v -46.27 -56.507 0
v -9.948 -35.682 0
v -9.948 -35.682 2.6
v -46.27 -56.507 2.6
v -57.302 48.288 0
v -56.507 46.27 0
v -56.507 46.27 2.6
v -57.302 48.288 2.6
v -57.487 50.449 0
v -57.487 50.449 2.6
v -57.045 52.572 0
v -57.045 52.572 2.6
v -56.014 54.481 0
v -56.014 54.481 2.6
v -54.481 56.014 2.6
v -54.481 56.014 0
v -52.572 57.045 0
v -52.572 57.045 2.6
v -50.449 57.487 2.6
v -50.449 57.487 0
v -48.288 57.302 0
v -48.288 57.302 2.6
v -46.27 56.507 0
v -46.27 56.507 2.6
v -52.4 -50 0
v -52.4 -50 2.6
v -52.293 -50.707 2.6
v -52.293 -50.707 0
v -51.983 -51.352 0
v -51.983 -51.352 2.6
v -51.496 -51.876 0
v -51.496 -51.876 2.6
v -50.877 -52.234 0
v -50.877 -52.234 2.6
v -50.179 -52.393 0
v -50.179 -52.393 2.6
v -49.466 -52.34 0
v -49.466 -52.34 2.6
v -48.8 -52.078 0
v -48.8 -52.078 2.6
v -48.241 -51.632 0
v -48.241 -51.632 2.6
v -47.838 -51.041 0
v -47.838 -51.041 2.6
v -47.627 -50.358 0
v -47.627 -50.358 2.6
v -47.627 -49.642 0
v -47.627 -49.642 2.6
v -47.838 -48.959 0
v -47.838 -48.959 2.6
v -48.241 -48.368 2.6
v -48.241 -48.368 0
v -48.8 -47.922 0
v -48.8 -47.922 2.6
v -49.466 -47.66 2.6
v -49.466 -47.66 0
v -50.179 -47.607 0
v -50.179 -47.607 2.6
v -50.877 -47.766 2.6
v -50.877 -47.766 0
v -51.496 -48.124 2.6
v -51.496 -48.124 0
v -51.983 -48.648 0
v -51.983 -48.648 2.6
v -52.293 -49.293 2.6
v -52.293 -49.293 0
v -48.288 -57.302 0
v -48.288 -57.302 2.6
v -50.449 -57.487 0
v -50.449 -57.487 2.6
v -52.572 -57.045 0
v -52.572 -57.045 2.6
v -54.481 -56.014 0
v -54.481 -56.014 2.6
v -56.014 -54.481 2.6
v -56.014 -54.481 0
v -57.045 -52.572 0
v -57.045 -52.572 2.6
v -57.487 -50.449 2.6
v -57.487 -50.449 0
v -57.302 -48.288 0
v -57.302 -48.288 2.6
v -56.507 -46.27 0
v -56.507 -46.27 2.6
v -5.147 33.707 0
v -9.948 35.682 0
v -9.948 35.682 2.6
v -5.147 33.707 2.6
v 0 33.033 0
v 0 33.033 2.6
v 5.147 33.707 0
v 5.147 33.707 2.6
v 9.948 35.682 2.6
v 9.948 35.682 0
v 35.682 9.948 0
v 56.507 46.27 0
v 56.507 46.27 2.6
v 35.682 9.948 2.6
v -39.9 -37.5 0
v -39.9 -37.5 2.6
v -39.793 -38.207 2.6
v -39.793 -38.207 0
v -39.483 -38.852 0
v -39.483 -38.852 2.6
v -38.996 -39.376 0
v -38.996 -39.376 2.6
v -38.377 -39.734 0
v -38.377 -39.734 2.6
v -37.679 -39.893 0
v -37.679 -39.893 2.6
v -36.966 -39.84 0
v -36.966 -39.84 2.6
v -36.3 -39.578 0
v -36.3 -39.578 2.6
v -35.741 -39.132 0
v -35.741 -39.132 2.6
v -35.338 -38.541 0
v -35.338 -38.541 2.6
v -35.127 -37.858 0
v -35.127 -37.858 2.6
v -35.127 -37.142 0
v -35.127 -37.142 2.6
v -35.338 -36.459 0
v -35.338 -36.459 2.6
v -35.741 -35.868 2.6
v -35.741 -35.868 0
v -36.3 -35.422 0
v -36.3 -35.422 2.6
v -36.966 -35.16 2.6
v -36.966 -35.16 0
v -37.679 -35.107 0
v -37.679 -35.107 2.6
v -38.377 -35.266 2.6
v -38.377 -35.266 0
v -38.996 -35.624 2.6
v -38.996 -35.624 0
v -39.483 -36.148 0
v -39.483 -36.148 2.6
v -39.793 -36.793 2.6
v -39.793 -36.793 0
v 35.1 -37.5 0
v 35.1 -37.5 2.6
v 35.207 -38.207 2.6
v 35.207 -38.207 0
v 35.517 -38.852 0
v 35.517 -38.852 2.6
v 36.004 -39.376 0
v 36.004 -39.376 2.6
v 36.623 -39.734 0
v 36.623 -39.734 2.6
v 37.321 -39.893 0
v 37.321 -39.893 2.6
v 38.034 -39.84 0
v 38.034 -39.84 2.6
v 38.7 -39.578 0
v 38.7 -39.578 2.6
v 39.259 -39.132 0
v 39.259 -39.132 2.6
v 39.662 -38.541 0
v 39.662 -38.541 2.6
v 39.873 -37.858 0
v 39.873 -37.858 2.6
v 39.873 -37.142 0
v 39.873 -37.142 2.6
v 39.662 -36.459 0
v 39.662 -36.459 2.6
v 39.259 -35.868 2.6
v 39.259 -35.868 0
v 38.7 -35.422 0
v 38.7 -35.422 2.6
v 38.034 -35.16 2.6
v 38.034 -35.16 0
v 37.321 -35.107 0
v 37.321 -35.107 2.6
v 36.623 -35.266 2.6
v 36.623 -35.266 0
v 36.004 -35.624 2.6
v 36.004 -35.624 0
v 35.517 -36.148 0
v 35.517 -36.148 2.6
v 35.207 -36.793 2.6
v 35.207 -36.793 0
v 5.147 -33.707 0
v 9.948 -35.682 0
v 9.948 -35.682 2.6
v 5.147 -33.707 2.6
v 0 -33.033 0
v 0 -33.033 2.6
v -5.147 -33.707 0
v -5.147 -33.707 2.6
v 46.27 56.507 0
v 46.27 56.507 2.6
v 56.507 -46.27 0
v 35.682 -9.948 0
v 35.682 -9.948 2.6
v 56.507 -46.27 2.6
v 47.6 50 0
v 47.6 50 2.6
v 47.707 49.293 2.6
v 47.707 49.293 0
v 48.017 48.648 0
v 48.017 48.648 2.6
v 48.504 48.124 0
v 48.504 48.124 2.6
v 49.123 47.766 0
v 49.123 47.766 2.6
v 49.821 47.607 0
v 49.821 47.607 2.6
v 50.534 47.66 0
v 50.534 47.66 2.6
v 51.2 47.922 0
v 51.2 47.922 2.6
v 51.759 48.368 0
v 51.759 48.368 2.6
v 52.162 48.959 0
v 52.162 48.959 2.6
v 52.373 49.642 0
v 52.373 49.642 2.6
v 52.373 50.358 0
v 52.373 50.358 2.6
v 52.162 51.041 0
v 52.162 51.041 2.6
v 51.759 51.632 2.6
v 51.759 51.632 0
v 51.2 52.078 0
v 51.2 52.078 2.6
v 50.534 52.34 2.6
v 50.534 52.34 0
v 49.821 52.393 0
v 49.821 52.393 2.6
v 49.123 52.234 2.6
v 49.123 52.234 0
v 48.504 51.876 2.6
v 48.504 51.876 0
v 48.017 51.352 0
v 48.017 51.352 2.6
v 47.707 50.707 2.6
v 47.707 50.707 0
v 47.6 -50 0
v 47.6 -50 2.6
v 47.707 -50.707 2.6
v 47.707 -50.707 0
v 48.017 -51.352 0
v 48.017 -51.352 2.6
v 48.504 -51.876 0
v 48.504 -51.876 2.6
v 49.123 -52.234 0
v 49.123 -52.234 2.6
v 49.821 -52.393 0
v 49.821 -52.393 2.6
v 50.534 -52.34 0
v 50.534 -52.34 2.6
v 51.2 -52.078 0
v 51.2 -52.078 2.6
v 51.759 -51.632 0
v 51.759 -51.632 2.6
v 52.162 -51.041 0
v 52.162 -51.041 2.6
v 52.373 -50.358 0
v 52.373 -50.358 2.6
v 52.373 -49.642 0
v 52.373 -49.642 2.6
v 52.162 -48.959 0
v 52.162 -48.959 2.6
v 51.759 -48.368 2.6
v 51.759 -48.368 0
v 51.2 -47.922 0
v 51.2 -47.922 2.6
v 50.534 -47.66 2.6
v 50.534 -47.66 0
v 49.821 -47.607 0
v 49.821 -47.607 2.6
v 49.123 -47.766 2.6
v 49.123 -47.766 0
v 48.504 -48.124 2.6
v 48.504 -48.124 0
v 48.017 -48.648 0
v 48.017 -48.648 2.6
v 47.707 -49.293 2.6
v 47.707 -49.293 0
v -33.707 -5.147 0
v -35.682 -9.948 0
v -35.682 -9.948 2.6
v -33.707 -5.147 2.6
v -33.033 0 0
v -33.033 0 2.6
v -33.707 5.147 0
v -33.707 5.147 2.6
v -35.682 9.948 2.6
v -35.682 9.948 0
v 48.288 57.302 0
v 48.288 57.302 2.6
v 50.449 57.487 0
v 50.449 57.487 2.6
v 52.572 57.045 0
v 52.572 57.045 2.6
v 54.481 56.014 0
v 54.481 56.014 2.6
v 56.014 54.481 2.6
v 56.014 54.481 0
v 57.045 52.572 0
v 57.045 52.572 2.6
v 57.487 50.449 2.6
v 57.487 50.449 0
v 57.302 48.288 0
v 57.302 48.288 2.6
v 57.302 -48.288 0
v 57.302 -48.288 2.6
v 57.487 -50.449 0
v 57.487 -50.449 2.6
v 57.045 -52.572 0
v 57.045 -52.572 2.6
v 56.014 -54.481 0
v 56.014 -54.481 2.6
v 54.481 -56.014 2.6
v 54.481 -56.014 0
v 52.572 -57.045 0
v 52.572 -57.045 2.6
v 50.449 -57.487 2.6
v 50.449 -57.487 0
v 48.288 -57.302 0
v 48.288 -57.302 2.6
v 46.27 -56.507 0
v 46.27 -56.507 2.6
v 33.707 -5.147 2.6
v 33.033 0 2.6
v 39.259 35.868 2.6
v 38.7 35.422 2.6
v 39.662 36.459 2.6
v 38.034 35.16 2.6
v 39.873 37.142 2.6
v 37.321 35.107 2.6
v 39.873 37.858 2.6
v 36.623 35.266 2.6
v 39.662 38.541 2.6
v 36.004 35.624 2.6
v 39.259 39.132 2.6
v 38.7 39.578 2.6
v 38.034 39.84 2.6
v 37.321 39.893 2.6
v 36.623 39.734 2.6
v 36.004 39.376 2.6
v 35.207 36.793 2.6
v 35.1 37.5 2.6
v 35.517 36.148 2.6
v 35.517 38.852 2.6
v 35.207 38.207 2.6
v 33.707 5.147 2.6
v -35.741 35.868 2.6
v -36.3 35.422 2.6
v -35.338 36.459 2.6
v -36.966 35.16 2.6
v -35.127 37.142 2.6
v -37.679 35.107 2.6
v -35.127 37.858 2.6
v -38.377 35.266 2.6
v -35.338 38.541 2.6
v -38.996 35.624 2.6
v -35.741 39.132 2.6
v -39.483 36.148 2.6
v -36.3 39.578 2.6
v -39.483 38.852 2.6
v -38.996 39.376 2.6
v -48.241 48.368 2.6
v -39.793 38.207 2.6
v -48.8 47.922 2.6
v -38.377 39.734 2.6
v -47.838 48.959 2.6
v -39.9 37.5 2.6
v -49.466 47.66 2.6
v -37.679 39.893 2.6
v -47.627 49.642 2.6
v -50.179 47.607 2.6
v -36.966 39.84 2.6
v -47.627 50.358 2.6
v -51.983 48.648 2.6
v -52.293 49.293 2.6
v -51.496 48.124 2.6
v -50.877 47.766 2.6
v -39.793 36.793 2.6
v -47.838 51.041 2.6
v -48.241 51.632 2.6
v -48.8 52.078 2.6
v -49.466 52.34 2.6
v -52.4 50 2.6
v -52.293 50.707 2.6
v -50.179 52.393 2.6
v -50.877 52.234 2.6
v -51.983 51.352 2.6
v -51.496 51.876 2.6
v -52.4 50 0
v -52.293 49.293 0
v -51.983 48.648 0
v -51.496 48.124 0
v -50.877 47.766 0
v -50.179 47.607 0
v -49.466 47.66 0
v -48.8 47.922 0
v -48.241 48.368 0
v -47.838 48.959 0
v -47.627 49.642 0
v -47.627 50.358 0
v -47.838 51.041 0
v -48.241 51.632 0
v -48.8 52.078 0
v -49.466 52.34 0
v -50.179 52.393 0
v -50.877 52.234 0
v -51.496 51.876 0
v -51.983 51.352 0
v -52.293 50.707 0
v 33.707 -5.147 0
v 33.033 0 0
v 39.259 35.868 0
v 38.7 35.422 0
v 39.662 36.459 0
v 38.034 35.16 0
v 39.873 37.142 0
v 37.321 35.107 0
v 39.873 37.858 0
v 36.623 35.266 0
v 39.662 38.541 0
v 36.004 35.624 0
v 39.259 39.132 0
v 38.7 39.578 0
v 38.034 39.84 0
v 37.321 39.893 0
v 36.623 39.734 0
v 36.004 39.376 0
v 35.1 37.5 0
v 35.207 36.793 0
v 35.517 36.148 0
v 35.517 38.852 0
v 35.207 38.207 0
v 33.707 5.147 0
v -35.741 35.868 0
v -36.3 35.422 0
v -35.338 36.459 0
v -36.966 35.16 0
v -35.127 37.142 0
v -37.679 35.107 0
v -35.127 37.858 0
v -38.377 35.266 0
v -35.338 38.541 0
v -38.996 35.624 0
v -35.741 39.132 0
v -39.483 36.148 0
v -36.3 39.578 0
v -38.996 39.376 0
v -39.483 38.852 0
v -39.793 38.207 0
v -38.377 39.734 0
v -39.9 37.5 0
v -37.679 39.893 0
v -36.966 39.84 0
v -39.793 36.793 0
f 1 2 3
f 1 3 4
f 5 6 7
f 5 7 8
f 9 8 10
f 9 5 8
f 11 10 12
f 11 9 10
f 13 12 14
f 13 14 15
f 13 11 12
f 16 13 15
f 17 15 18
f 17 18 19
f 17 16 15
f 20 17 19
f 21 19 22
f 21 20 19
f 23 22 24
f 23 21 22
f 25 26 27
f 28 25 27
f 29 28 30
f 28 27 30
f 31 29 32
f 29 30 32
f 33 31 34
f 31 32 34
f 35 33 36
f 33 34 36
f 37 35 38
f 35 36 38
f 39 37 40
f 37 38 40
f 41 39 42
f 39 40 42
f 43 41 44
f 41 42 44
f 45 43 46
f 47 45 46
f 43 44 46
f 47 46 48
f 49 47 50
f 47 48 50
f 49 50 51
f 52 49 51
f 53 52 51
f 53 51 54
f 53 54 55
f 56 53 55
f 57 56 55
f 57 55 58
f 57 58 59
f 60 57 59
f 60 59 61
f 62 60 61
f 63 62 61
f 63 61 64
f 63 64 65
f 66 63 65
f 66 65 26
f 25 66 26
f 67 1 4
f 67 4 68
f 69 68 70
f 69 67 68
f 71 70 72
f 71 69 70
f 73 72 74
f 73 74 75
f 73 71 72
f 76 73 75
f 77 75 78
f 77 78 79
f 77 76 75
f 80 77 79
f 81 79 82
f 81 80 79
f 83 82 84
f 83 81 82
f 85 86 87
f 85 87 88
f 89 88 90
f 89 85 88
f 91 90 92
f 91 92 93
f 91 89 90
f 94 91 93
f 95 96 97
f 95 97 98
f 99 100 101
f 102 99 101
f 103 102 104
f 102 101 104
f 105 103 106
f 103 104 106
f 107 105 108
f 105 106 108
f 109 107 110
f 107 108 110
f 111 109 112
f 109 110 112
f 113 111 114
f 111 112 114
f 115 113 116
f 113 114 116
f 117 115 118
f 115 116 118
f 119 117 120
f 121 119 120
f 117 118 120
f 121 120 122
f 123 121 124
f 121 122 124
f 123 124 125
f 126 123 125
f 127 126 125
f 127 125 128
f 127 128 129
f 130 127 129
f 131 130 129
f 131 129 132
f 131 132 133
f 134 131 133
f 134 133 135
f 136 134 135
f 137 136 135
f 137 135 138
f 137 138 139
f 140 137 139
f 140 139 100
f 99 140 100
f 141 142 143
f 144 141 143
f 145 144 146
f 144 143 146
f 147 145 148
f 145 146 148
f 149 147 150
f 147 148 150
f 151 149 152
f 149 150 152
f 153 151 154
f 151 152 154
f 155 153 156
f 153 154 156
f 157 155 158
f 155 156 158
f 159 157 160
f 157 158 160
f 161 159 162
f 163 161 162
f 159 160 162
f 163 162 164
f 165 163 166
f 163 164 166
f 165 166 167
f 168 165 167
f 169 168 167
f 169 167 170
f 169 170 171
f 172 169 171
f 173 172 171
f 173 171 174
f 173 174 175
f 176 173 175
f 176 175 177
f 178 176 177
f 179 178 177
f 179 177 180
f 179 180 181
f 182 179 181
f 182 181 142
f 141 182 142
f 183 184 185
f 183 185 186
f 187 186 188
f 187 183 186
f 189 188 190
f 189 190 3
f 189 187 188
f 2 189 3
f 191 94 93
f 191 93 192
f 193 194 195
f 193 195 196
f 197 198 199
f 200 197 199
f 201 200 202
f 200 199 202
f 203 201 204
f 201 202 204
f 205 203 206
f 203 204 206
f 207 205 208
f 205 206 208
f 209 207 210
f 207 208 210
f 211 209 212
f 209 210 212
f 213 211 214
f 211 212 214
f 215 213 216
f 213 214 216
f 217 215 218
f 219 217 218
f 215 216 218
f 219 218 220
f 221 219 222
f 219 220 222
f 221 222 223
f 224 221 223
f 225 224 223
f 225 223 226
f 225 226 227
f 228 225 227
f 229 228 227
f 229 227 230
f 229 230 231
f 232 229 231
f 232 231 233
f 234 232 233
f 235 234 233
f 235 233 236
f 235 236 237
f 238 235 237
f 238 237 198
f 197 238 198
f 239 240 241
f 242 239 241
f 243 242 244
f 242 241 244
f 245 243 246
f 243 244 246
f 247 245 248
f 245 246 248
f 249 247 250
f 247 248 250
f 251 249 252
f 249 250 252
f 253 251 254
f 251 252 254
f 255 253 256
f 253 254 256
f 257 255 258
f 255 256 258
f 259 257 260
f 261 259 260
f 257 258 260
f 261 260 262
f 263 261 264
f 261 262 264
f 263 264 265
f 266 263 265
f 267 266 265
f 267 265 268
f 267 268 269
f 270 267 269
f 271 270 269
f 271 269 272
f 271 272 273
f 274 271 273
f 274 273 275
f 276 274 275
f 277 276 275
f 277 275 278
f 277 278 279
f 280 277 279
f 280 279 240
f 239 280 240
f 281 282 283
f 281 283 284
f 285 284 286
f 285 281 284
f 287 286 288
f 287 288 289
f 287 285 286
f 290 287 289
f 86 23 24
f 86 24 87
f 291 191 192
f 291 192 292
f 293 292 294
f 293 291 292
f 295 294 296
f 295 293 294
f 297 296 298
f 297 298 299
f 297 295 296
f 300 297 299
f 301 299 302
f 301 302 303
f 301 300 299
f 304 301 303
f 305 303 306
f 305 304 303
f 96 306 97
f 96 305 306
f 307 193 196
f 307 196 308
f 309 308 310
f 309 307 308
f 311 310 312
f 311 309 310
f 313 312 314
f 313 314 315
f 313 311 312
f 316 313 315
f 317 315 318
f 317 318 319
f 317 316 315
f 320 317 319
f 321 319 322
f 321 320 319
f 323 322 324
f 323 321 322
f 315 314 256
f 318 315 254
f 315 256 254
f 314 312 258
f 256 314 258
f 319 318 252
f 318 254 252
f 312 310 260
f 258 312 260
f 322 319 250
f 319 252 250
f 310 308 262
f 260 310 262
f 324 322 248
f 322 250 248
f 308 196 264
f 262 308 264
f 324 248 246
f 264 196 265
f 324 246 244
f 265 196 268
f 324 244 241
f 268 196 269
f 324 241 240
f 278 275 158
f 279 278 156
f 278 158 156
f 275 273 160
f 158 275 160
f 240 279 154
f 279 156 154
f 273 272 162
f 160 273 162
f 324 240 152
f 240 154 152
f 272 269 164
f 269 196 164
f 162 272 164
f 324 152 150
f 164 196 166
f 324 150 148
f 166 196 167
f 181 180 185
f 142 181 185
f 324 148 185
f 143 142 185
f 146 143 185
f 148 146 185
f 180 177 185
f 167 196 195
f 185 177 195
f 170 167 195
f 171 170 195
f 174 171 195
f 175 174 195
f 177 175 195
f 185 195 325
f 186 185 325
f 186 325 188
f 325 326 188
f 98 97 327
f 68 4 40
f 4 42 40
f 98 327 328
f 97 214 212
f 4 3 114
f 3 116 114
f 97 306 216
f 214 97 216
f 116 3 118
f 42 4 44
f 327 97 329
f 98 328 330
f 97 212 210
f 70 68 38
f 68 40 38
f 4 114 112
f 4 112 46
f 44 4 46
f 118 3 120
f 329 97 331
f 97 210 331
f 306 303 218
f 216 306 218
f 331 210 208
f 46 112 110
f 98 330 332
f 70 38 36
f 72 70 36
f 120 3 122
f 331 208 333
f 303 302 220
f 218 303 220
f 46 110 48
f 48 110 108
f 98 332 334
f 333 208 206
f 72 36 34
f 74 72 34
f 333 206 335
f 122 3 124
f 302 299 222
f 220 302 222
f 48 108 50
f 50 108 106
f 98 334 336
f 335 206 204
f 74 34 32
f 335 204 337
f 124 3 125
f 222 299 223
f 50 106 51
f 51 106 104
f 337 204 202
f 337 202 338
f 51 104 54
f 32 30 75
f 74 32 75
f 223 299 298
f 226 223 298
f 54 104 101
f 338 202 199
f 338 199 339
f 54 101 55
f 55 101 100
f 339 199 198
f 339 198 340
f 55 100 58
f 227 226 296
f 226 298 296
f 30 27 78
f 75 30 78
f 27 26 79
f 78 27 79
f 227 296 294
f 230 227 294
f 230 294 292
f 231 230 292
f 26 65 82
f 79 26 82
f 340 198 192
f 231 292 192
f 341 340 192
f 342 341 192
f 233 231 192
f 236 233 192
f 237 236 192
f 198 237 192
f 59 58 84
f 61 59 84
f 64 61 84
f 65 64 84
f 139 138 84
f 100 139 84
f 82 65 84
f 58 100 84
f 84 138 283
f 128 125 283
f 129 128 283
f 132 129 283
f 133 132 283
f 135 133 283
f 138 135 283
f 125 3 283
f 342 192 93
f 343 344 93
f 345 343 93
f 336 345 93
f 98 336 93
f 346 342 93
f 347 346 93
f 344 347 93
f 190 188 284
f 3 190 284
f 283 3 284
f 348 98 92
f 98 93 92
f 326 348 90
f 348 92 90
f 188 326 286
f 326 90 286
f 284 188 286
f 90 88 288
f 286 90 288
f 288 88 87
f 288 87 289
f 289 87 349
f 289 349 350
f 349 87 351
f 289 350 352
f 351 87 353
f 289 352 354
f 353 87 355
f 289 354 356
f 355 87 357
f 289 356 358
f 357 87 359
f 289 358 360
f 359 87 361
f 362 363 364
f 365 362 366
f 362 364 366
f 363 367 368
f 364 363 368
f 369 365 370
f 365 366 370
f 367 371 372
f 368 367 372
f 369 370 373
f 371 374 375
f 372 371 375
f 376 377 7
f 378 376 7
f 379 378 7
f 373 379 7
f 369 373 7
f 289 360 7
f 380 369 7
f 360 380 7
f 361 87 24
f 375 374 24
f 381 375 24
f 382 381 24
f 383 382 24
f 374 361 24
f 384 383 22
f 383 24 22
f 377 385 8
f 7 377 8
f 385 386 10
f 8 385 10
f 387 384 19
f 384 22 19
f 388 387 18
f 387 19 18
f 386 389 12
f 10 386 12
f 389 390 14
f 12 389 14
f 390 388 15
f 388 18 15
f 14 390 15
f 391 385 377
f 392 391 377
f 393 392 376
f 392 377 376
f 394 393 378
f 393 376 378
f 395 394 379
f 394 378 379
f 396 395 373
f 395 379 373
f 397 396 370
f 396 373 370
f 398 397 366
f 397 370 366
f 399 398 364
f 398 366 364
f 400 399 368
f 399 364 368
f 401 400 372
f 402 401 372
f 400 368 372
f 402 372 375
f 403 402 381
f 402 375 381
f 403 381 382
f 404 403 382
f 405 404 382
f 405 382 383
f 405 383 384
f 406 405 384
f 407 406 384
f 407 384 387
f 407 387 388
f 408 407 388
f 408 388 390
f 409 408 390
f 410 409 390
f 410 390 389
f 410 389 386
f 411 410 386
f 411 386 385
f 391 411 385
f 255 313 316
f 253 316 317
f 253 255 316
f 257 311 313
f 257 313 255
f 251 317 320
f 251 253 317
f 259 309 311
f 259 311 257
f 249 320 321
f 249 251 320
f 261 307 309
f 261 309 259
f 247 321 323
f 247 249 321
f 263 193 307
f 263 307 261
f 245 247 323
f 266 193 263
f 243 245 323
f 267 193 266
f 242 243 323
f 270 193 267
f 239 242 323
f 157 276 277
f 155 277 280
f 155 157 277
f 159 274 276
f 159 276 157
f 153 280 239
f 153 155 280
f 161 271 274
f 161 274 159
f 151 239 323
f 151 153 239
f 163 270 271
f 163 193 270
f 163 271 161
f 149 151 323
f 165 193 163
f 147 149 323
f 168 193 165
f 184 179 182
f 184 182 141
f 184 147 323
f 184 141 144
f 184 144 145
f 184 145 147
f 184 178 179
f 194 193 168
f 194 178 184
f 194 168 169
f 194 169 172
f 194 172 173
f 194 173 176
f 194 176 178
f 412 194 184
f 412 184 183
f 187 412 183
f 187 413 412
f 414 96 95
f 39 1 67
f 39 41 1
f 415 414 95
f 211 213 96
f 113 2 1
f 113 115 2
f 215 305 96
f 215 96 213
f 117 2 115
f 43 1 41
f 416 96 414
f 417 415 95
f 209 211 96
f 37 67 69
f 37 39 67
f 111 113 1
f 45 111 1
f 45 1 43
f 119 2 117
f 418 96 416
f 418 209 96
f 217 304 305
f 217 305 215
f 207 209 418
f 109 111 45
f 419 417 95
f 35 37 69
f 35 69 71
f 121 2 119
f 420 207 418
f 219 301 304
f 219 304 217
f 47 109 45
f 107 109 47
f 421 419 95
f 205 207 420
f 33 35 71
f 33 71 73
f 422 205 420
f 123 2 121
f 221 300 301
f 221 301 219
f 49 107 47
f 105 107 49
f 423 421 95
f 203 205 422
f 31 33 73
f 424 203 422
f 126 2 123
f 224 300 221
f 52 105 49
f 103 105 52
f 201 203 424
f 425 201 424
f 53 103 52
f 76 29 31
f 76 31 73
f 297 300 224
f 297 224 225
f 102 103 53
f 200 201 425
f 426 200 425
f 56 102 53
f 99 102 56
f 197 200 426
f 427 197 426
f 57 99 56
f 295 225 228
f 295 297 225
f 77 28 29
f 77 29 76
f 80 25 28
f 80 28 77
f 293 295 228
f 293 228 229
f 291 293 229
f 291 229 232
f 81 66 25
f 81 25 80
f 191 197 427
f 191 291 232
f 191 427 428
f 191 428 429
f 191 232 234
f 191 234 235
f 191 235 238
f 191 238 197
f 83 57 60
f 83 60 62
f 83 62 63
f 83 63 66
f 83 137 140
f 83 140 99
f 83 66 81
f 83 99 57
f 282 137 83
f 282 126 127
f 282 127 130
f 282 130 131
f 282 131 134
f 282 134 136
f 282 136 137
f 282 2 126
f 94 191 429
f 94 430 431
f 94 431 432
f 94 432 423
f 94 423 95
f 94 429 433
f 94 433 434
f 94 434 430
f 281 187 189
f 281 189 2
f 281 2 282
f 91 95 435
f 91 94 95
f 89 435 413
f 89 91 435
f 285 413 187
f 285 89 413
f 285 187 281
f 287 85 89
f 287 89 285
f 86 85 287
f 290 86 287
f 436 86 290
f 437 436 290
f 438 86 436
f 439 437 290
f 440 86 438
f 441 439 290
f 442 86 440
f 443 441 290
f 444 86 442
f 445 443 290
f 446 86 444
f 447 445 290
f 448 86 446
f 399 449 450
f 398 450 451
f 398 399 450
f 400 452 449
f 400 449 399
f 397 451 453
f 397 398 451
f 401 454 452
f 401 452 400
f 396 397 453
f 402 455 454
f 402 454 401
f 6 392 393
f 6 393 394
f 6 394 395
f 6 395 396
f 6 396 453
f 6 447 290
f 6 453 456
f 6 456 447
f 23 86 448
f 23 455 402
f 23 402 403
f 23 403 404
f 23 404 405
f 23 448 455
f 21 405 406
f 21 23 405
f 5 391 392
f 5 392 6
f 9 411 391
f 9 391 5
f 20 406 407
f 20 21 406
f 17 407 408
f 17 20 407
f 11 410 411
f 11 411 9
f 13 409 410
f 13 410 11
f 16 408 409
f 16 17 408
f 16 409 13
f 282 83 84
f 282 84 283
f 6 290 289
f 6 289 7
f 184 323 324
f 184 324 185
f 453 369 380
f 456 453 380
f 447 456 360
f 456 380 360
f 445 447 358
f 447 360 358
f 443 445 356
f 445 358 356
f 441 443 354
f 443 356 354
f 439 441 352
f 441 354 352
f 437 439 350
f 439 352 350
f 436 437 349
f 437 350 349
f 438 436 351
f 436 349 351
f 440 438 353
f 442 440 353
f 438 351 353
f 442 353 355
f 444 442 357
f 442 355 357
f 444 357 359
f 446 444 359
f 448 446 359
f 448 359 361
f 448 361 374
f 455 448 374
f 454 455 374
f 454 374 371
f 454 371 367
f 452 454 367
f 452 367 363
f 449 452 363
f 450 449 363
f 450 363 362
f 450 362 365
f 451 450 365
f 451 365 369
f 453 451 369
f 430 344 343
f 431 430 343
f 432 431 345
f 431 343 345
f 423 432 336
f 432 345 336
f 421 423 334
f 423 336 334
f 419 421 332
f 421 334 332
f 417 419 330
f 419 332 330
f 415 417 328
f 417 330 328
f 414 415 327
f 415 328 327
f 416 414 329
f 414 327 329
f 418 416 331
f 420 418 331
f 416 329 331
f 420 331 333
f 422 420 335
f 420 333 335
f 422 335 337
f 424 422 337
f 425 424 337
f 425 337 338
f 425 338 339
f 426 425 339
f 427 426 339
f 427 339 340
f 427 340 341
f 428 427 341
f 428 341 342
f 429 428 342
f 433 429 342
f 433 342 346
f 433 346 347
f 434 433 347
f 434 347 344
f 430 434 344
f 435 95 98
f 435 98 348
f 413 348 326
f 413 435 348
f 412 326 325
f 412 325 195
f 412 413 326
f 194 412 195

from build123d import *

# Parameters (mm, degrees)
BOSS_EXTRUDE1_DEPTH  = 2.6
M4_CLEARANCE_HOLE1_D = 4.8


with BuildPart() as part:
    # Sketch1 → Boss-Extrude1 (new body)
    with BuildSketch(Plane.XY):
        with BuildLine():
            Line((-35.68229717, 9.947502865), (-56.506516782, 46.269686426))
            ThreePointArc((-56.506516782, 46.269686426), (-55.303300859, 55.303300859), (-46.269686426, 56.506516782))
            Line((-46.269686426, 56.506516782), (-9.947502865, 35.68229717))
            ThreePointArc((-9.947502865, 35.68229717), (0, 33.033008589), (9.947502865, 35.68229717))
            Line((9.947502865, 35.68229717), (46.269686426, 56.506516782))
            ThreePointArc((46.269686426, 56.506516782), (55.303300859, 55.303300859), (56.506516782, 46.269686426))
            Line((56.506516782, 46.269686426), (35.68229717, 9.947502865))
            ThreePointArc((35.68229717, 9.947502865), (33.033008589, 0), (35.68229717, -9.947502865))
            Line((35.68229717, -9.947502865), (56.506516782, -46.269686426))
            ThreePointArc((56.506516782, -46.269686426), (55.303300859, -55.303300859), (46.269686426, -56.506516782))
            Line((46.269686426, -56.506516782), (9.947502865, -35.68229717))
            ThreePointArc((9.947502865, -35.68229717), (0, -33.033008589), (-9.947502865, -35.68229717))
            Line((-9.947502865, -35.68229717), (-46.269686426, -56.506516782))
            ThreePointArc((-46.269686426, -56.506516782), (-55.303300859, -55.303300859), (-56.506516782, -46.269686426))
            Line((-56.506516782, -46.269686426), (-35.68229717, -9.947502865))
            ThreePointArc((-35.68229717, -9.947502865), (-33.033008589, 0), (-35.68229717, 9.947502865))
        make_face()
    extrude(amount=BOSS_EXTRUDE1_DEPTH)

    # M4 Clearance Hole1 (through all)
    with Locations(Plane(origin=(0, 0, 0), x_dir=(1, 0, 0), z_dir=(0, 0, -1))):
        with Locations((-50, -50), (-37.5, -37.5), (37.5, -37.5), (50, -50), (50, 50), (37.5, 37.5), (-37.5, 37.5), (-50, 50)):
            Hole(M4_CLEARANCE_HOLE1_D / 2)


solid = part.part
